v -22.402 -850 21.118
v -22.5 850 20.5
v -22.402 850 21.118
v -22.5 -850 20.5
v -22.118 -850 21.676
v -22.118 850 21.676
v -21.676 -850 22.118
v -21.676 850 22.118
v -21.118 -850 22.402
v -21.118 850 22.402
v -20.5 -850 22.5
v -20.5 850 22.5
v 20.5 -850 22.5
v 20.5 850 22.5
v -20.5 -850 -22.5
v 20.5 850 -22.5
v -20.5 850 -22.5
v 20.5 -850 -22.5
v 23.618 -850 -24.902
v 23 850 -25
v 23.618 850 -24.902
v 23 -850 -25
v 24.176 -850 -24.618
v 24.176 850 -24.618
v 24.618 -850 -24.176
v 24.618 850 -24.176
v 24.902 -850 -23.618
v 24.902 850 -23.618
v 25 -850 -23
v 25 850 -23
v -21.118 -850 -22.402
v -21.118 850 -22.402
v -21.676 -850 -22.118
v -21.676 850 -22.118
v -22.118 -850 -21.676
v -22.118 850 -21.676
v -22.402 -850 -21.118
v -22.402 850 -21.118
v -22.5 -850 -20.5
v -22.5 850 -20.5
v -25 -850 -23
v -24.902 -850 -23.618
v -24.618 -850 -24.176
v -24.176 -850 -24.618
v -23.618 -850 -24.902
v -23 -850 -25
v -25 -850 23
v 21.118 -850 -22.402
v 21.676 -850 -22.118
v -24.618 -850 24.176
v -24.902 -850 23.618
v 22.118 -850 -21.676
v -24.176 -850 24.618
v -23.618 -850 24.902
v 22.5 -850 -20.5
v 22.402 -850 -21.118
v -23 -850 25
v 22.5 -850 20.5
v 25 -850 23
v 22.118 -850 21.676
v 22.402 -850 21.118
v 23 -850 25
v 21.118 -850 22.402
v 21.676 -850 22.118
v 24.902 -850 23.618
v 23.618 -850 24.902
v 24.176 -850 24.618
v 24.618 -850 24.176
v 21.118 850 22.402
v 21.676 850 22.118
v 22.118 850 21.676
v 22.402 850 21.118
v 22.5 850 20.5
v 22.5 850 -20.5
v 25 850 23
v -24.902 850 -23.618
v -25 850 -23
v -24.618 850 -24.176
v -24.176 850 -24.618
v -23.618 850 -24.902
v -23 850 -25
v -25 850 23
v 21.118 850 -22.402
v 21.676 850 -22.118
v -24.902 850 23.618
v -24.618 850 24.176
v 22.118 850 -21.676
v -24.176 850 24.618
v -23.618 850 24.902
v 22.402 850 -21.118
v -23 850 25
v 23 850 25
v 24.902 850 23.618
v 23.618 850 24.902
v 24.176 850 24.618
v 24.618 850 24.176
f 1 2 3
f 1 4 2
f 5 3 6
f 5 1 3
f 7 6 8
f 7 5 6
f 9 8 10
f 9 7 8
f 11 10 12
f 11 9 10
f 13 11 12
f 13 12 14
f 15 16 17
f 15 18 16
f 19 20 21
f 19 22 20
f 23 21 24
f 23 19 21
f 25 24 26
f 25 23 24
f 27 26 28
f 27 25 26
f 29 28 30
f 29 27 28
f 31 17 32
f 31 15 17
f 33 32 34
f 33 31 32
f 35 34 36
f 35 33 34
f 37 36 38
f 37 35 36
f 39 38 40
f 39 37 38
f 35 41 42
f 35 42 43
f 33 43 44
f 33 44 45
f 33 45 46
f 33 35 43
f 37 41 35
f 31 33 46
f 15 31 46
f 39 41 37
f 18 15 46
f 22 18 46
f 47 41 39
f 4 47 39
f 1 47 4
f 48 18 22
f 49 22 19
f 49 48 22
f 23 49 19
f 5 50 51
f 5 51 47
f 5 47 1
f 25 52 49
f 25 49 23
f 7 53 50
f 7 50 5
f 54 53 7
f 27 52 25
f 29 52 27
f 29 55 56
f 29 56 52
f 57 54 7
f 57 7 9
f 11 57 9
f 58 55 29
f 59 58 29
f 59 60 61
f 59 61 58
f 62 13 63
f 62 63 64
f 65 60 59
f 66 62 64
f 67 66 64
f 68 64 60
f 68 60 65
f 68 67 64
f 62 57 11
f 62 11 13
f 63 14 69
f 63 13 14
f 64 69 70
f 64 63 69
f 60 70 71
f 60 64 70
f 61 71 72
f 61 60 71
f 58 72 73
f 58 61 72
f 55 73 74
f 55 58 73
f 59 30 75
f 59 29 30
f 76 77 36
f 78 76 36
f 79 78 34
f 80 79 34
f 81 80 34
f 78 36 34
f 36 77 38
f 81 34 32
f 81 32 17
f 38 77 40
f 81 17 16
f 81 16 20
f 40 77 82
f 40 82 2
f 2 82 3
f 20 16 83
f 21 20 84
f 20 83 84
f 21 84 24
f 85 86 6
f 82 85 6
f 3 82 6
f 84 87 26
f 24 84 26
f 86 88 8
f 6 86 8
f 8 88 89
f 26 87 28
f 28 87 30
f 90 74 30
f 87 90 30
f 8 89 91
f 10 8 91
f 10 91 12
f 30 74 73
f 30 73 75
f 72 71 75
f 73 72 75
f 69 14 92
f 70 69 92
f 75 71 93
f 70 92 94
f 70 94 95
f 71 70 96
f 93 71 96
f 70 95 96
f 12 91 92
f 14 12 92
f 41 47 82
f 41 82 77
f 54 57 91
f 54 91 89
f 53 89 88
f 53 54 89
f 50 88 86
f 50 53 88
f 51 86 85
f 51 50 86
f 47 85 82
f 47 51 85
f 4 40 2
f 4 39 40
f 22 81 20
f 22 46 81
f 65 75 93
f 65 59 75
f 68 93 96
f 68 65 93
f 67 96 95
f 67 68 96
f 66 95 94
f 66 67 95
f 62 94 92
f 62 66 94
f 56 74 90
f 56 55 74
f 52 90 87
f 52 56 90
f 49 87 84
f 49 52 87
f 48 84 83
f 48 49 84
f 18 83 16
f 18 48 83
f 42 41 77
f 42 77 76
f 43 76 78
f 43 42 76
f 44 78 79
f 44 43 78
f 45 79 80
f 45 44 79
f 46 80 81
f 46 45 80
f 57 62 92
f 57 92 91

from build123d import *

# Parameters (mm, degrees)
F1_DEPTH = 850


with BuildPart() as f1:
    # F0 (on Front) → F1 (new body, symmetric)
    with BuildSketch(Plane.XZ):
        with BuildLine():
            ThreePointArc((25, 23), (24.414214, 24.414214), (23, 25))
            Line((23, 25), (-23, 25))
            ThreePointArc((-23, 25), (-24.414214, 24.414214), (-25, 23))
            Line((-25, 23), (-25, -23))
            ThreePointArc((-25, -23), (-24.414214, -24.414214), (-23, -25))
            Line((-23, -25), (23, -25))
            ThreePointArc((23, -25), (24.414214, -24.414214), (25, -23))
            Line((25, -23), (25, 23))
        make_face()
        with BuildLine():
            Line((-20.5, 22.5), (20.5, 22.5))
            ThreePointArc((20.5, 22.5), (21.914214, 21.914214), (22.5, 20.5))
            Line((22.5, 20.5), (22.5, -20.5))
            ThreePointArc((22.5, -20.5), (21.914214, -21.914214), (20.5, -22.5))
            Line((20.5, -22.5), (-20.5, -22.5))
            ThreePointArc((-20.5, -22.5), (-21.914214, -21.914214), (-22.5, -20.5))
            Line((-22.5, -20.5), (-22.5, 20.5))
            ThreePointArc((-22.5, 20.5), (-21.914214, 21.914214), (-20.5, 22.5))
        make_face(mode=Mode.SUBTRACT)
    extrude(amount=F1_DEPTH, both=True)


solid = f1.part
